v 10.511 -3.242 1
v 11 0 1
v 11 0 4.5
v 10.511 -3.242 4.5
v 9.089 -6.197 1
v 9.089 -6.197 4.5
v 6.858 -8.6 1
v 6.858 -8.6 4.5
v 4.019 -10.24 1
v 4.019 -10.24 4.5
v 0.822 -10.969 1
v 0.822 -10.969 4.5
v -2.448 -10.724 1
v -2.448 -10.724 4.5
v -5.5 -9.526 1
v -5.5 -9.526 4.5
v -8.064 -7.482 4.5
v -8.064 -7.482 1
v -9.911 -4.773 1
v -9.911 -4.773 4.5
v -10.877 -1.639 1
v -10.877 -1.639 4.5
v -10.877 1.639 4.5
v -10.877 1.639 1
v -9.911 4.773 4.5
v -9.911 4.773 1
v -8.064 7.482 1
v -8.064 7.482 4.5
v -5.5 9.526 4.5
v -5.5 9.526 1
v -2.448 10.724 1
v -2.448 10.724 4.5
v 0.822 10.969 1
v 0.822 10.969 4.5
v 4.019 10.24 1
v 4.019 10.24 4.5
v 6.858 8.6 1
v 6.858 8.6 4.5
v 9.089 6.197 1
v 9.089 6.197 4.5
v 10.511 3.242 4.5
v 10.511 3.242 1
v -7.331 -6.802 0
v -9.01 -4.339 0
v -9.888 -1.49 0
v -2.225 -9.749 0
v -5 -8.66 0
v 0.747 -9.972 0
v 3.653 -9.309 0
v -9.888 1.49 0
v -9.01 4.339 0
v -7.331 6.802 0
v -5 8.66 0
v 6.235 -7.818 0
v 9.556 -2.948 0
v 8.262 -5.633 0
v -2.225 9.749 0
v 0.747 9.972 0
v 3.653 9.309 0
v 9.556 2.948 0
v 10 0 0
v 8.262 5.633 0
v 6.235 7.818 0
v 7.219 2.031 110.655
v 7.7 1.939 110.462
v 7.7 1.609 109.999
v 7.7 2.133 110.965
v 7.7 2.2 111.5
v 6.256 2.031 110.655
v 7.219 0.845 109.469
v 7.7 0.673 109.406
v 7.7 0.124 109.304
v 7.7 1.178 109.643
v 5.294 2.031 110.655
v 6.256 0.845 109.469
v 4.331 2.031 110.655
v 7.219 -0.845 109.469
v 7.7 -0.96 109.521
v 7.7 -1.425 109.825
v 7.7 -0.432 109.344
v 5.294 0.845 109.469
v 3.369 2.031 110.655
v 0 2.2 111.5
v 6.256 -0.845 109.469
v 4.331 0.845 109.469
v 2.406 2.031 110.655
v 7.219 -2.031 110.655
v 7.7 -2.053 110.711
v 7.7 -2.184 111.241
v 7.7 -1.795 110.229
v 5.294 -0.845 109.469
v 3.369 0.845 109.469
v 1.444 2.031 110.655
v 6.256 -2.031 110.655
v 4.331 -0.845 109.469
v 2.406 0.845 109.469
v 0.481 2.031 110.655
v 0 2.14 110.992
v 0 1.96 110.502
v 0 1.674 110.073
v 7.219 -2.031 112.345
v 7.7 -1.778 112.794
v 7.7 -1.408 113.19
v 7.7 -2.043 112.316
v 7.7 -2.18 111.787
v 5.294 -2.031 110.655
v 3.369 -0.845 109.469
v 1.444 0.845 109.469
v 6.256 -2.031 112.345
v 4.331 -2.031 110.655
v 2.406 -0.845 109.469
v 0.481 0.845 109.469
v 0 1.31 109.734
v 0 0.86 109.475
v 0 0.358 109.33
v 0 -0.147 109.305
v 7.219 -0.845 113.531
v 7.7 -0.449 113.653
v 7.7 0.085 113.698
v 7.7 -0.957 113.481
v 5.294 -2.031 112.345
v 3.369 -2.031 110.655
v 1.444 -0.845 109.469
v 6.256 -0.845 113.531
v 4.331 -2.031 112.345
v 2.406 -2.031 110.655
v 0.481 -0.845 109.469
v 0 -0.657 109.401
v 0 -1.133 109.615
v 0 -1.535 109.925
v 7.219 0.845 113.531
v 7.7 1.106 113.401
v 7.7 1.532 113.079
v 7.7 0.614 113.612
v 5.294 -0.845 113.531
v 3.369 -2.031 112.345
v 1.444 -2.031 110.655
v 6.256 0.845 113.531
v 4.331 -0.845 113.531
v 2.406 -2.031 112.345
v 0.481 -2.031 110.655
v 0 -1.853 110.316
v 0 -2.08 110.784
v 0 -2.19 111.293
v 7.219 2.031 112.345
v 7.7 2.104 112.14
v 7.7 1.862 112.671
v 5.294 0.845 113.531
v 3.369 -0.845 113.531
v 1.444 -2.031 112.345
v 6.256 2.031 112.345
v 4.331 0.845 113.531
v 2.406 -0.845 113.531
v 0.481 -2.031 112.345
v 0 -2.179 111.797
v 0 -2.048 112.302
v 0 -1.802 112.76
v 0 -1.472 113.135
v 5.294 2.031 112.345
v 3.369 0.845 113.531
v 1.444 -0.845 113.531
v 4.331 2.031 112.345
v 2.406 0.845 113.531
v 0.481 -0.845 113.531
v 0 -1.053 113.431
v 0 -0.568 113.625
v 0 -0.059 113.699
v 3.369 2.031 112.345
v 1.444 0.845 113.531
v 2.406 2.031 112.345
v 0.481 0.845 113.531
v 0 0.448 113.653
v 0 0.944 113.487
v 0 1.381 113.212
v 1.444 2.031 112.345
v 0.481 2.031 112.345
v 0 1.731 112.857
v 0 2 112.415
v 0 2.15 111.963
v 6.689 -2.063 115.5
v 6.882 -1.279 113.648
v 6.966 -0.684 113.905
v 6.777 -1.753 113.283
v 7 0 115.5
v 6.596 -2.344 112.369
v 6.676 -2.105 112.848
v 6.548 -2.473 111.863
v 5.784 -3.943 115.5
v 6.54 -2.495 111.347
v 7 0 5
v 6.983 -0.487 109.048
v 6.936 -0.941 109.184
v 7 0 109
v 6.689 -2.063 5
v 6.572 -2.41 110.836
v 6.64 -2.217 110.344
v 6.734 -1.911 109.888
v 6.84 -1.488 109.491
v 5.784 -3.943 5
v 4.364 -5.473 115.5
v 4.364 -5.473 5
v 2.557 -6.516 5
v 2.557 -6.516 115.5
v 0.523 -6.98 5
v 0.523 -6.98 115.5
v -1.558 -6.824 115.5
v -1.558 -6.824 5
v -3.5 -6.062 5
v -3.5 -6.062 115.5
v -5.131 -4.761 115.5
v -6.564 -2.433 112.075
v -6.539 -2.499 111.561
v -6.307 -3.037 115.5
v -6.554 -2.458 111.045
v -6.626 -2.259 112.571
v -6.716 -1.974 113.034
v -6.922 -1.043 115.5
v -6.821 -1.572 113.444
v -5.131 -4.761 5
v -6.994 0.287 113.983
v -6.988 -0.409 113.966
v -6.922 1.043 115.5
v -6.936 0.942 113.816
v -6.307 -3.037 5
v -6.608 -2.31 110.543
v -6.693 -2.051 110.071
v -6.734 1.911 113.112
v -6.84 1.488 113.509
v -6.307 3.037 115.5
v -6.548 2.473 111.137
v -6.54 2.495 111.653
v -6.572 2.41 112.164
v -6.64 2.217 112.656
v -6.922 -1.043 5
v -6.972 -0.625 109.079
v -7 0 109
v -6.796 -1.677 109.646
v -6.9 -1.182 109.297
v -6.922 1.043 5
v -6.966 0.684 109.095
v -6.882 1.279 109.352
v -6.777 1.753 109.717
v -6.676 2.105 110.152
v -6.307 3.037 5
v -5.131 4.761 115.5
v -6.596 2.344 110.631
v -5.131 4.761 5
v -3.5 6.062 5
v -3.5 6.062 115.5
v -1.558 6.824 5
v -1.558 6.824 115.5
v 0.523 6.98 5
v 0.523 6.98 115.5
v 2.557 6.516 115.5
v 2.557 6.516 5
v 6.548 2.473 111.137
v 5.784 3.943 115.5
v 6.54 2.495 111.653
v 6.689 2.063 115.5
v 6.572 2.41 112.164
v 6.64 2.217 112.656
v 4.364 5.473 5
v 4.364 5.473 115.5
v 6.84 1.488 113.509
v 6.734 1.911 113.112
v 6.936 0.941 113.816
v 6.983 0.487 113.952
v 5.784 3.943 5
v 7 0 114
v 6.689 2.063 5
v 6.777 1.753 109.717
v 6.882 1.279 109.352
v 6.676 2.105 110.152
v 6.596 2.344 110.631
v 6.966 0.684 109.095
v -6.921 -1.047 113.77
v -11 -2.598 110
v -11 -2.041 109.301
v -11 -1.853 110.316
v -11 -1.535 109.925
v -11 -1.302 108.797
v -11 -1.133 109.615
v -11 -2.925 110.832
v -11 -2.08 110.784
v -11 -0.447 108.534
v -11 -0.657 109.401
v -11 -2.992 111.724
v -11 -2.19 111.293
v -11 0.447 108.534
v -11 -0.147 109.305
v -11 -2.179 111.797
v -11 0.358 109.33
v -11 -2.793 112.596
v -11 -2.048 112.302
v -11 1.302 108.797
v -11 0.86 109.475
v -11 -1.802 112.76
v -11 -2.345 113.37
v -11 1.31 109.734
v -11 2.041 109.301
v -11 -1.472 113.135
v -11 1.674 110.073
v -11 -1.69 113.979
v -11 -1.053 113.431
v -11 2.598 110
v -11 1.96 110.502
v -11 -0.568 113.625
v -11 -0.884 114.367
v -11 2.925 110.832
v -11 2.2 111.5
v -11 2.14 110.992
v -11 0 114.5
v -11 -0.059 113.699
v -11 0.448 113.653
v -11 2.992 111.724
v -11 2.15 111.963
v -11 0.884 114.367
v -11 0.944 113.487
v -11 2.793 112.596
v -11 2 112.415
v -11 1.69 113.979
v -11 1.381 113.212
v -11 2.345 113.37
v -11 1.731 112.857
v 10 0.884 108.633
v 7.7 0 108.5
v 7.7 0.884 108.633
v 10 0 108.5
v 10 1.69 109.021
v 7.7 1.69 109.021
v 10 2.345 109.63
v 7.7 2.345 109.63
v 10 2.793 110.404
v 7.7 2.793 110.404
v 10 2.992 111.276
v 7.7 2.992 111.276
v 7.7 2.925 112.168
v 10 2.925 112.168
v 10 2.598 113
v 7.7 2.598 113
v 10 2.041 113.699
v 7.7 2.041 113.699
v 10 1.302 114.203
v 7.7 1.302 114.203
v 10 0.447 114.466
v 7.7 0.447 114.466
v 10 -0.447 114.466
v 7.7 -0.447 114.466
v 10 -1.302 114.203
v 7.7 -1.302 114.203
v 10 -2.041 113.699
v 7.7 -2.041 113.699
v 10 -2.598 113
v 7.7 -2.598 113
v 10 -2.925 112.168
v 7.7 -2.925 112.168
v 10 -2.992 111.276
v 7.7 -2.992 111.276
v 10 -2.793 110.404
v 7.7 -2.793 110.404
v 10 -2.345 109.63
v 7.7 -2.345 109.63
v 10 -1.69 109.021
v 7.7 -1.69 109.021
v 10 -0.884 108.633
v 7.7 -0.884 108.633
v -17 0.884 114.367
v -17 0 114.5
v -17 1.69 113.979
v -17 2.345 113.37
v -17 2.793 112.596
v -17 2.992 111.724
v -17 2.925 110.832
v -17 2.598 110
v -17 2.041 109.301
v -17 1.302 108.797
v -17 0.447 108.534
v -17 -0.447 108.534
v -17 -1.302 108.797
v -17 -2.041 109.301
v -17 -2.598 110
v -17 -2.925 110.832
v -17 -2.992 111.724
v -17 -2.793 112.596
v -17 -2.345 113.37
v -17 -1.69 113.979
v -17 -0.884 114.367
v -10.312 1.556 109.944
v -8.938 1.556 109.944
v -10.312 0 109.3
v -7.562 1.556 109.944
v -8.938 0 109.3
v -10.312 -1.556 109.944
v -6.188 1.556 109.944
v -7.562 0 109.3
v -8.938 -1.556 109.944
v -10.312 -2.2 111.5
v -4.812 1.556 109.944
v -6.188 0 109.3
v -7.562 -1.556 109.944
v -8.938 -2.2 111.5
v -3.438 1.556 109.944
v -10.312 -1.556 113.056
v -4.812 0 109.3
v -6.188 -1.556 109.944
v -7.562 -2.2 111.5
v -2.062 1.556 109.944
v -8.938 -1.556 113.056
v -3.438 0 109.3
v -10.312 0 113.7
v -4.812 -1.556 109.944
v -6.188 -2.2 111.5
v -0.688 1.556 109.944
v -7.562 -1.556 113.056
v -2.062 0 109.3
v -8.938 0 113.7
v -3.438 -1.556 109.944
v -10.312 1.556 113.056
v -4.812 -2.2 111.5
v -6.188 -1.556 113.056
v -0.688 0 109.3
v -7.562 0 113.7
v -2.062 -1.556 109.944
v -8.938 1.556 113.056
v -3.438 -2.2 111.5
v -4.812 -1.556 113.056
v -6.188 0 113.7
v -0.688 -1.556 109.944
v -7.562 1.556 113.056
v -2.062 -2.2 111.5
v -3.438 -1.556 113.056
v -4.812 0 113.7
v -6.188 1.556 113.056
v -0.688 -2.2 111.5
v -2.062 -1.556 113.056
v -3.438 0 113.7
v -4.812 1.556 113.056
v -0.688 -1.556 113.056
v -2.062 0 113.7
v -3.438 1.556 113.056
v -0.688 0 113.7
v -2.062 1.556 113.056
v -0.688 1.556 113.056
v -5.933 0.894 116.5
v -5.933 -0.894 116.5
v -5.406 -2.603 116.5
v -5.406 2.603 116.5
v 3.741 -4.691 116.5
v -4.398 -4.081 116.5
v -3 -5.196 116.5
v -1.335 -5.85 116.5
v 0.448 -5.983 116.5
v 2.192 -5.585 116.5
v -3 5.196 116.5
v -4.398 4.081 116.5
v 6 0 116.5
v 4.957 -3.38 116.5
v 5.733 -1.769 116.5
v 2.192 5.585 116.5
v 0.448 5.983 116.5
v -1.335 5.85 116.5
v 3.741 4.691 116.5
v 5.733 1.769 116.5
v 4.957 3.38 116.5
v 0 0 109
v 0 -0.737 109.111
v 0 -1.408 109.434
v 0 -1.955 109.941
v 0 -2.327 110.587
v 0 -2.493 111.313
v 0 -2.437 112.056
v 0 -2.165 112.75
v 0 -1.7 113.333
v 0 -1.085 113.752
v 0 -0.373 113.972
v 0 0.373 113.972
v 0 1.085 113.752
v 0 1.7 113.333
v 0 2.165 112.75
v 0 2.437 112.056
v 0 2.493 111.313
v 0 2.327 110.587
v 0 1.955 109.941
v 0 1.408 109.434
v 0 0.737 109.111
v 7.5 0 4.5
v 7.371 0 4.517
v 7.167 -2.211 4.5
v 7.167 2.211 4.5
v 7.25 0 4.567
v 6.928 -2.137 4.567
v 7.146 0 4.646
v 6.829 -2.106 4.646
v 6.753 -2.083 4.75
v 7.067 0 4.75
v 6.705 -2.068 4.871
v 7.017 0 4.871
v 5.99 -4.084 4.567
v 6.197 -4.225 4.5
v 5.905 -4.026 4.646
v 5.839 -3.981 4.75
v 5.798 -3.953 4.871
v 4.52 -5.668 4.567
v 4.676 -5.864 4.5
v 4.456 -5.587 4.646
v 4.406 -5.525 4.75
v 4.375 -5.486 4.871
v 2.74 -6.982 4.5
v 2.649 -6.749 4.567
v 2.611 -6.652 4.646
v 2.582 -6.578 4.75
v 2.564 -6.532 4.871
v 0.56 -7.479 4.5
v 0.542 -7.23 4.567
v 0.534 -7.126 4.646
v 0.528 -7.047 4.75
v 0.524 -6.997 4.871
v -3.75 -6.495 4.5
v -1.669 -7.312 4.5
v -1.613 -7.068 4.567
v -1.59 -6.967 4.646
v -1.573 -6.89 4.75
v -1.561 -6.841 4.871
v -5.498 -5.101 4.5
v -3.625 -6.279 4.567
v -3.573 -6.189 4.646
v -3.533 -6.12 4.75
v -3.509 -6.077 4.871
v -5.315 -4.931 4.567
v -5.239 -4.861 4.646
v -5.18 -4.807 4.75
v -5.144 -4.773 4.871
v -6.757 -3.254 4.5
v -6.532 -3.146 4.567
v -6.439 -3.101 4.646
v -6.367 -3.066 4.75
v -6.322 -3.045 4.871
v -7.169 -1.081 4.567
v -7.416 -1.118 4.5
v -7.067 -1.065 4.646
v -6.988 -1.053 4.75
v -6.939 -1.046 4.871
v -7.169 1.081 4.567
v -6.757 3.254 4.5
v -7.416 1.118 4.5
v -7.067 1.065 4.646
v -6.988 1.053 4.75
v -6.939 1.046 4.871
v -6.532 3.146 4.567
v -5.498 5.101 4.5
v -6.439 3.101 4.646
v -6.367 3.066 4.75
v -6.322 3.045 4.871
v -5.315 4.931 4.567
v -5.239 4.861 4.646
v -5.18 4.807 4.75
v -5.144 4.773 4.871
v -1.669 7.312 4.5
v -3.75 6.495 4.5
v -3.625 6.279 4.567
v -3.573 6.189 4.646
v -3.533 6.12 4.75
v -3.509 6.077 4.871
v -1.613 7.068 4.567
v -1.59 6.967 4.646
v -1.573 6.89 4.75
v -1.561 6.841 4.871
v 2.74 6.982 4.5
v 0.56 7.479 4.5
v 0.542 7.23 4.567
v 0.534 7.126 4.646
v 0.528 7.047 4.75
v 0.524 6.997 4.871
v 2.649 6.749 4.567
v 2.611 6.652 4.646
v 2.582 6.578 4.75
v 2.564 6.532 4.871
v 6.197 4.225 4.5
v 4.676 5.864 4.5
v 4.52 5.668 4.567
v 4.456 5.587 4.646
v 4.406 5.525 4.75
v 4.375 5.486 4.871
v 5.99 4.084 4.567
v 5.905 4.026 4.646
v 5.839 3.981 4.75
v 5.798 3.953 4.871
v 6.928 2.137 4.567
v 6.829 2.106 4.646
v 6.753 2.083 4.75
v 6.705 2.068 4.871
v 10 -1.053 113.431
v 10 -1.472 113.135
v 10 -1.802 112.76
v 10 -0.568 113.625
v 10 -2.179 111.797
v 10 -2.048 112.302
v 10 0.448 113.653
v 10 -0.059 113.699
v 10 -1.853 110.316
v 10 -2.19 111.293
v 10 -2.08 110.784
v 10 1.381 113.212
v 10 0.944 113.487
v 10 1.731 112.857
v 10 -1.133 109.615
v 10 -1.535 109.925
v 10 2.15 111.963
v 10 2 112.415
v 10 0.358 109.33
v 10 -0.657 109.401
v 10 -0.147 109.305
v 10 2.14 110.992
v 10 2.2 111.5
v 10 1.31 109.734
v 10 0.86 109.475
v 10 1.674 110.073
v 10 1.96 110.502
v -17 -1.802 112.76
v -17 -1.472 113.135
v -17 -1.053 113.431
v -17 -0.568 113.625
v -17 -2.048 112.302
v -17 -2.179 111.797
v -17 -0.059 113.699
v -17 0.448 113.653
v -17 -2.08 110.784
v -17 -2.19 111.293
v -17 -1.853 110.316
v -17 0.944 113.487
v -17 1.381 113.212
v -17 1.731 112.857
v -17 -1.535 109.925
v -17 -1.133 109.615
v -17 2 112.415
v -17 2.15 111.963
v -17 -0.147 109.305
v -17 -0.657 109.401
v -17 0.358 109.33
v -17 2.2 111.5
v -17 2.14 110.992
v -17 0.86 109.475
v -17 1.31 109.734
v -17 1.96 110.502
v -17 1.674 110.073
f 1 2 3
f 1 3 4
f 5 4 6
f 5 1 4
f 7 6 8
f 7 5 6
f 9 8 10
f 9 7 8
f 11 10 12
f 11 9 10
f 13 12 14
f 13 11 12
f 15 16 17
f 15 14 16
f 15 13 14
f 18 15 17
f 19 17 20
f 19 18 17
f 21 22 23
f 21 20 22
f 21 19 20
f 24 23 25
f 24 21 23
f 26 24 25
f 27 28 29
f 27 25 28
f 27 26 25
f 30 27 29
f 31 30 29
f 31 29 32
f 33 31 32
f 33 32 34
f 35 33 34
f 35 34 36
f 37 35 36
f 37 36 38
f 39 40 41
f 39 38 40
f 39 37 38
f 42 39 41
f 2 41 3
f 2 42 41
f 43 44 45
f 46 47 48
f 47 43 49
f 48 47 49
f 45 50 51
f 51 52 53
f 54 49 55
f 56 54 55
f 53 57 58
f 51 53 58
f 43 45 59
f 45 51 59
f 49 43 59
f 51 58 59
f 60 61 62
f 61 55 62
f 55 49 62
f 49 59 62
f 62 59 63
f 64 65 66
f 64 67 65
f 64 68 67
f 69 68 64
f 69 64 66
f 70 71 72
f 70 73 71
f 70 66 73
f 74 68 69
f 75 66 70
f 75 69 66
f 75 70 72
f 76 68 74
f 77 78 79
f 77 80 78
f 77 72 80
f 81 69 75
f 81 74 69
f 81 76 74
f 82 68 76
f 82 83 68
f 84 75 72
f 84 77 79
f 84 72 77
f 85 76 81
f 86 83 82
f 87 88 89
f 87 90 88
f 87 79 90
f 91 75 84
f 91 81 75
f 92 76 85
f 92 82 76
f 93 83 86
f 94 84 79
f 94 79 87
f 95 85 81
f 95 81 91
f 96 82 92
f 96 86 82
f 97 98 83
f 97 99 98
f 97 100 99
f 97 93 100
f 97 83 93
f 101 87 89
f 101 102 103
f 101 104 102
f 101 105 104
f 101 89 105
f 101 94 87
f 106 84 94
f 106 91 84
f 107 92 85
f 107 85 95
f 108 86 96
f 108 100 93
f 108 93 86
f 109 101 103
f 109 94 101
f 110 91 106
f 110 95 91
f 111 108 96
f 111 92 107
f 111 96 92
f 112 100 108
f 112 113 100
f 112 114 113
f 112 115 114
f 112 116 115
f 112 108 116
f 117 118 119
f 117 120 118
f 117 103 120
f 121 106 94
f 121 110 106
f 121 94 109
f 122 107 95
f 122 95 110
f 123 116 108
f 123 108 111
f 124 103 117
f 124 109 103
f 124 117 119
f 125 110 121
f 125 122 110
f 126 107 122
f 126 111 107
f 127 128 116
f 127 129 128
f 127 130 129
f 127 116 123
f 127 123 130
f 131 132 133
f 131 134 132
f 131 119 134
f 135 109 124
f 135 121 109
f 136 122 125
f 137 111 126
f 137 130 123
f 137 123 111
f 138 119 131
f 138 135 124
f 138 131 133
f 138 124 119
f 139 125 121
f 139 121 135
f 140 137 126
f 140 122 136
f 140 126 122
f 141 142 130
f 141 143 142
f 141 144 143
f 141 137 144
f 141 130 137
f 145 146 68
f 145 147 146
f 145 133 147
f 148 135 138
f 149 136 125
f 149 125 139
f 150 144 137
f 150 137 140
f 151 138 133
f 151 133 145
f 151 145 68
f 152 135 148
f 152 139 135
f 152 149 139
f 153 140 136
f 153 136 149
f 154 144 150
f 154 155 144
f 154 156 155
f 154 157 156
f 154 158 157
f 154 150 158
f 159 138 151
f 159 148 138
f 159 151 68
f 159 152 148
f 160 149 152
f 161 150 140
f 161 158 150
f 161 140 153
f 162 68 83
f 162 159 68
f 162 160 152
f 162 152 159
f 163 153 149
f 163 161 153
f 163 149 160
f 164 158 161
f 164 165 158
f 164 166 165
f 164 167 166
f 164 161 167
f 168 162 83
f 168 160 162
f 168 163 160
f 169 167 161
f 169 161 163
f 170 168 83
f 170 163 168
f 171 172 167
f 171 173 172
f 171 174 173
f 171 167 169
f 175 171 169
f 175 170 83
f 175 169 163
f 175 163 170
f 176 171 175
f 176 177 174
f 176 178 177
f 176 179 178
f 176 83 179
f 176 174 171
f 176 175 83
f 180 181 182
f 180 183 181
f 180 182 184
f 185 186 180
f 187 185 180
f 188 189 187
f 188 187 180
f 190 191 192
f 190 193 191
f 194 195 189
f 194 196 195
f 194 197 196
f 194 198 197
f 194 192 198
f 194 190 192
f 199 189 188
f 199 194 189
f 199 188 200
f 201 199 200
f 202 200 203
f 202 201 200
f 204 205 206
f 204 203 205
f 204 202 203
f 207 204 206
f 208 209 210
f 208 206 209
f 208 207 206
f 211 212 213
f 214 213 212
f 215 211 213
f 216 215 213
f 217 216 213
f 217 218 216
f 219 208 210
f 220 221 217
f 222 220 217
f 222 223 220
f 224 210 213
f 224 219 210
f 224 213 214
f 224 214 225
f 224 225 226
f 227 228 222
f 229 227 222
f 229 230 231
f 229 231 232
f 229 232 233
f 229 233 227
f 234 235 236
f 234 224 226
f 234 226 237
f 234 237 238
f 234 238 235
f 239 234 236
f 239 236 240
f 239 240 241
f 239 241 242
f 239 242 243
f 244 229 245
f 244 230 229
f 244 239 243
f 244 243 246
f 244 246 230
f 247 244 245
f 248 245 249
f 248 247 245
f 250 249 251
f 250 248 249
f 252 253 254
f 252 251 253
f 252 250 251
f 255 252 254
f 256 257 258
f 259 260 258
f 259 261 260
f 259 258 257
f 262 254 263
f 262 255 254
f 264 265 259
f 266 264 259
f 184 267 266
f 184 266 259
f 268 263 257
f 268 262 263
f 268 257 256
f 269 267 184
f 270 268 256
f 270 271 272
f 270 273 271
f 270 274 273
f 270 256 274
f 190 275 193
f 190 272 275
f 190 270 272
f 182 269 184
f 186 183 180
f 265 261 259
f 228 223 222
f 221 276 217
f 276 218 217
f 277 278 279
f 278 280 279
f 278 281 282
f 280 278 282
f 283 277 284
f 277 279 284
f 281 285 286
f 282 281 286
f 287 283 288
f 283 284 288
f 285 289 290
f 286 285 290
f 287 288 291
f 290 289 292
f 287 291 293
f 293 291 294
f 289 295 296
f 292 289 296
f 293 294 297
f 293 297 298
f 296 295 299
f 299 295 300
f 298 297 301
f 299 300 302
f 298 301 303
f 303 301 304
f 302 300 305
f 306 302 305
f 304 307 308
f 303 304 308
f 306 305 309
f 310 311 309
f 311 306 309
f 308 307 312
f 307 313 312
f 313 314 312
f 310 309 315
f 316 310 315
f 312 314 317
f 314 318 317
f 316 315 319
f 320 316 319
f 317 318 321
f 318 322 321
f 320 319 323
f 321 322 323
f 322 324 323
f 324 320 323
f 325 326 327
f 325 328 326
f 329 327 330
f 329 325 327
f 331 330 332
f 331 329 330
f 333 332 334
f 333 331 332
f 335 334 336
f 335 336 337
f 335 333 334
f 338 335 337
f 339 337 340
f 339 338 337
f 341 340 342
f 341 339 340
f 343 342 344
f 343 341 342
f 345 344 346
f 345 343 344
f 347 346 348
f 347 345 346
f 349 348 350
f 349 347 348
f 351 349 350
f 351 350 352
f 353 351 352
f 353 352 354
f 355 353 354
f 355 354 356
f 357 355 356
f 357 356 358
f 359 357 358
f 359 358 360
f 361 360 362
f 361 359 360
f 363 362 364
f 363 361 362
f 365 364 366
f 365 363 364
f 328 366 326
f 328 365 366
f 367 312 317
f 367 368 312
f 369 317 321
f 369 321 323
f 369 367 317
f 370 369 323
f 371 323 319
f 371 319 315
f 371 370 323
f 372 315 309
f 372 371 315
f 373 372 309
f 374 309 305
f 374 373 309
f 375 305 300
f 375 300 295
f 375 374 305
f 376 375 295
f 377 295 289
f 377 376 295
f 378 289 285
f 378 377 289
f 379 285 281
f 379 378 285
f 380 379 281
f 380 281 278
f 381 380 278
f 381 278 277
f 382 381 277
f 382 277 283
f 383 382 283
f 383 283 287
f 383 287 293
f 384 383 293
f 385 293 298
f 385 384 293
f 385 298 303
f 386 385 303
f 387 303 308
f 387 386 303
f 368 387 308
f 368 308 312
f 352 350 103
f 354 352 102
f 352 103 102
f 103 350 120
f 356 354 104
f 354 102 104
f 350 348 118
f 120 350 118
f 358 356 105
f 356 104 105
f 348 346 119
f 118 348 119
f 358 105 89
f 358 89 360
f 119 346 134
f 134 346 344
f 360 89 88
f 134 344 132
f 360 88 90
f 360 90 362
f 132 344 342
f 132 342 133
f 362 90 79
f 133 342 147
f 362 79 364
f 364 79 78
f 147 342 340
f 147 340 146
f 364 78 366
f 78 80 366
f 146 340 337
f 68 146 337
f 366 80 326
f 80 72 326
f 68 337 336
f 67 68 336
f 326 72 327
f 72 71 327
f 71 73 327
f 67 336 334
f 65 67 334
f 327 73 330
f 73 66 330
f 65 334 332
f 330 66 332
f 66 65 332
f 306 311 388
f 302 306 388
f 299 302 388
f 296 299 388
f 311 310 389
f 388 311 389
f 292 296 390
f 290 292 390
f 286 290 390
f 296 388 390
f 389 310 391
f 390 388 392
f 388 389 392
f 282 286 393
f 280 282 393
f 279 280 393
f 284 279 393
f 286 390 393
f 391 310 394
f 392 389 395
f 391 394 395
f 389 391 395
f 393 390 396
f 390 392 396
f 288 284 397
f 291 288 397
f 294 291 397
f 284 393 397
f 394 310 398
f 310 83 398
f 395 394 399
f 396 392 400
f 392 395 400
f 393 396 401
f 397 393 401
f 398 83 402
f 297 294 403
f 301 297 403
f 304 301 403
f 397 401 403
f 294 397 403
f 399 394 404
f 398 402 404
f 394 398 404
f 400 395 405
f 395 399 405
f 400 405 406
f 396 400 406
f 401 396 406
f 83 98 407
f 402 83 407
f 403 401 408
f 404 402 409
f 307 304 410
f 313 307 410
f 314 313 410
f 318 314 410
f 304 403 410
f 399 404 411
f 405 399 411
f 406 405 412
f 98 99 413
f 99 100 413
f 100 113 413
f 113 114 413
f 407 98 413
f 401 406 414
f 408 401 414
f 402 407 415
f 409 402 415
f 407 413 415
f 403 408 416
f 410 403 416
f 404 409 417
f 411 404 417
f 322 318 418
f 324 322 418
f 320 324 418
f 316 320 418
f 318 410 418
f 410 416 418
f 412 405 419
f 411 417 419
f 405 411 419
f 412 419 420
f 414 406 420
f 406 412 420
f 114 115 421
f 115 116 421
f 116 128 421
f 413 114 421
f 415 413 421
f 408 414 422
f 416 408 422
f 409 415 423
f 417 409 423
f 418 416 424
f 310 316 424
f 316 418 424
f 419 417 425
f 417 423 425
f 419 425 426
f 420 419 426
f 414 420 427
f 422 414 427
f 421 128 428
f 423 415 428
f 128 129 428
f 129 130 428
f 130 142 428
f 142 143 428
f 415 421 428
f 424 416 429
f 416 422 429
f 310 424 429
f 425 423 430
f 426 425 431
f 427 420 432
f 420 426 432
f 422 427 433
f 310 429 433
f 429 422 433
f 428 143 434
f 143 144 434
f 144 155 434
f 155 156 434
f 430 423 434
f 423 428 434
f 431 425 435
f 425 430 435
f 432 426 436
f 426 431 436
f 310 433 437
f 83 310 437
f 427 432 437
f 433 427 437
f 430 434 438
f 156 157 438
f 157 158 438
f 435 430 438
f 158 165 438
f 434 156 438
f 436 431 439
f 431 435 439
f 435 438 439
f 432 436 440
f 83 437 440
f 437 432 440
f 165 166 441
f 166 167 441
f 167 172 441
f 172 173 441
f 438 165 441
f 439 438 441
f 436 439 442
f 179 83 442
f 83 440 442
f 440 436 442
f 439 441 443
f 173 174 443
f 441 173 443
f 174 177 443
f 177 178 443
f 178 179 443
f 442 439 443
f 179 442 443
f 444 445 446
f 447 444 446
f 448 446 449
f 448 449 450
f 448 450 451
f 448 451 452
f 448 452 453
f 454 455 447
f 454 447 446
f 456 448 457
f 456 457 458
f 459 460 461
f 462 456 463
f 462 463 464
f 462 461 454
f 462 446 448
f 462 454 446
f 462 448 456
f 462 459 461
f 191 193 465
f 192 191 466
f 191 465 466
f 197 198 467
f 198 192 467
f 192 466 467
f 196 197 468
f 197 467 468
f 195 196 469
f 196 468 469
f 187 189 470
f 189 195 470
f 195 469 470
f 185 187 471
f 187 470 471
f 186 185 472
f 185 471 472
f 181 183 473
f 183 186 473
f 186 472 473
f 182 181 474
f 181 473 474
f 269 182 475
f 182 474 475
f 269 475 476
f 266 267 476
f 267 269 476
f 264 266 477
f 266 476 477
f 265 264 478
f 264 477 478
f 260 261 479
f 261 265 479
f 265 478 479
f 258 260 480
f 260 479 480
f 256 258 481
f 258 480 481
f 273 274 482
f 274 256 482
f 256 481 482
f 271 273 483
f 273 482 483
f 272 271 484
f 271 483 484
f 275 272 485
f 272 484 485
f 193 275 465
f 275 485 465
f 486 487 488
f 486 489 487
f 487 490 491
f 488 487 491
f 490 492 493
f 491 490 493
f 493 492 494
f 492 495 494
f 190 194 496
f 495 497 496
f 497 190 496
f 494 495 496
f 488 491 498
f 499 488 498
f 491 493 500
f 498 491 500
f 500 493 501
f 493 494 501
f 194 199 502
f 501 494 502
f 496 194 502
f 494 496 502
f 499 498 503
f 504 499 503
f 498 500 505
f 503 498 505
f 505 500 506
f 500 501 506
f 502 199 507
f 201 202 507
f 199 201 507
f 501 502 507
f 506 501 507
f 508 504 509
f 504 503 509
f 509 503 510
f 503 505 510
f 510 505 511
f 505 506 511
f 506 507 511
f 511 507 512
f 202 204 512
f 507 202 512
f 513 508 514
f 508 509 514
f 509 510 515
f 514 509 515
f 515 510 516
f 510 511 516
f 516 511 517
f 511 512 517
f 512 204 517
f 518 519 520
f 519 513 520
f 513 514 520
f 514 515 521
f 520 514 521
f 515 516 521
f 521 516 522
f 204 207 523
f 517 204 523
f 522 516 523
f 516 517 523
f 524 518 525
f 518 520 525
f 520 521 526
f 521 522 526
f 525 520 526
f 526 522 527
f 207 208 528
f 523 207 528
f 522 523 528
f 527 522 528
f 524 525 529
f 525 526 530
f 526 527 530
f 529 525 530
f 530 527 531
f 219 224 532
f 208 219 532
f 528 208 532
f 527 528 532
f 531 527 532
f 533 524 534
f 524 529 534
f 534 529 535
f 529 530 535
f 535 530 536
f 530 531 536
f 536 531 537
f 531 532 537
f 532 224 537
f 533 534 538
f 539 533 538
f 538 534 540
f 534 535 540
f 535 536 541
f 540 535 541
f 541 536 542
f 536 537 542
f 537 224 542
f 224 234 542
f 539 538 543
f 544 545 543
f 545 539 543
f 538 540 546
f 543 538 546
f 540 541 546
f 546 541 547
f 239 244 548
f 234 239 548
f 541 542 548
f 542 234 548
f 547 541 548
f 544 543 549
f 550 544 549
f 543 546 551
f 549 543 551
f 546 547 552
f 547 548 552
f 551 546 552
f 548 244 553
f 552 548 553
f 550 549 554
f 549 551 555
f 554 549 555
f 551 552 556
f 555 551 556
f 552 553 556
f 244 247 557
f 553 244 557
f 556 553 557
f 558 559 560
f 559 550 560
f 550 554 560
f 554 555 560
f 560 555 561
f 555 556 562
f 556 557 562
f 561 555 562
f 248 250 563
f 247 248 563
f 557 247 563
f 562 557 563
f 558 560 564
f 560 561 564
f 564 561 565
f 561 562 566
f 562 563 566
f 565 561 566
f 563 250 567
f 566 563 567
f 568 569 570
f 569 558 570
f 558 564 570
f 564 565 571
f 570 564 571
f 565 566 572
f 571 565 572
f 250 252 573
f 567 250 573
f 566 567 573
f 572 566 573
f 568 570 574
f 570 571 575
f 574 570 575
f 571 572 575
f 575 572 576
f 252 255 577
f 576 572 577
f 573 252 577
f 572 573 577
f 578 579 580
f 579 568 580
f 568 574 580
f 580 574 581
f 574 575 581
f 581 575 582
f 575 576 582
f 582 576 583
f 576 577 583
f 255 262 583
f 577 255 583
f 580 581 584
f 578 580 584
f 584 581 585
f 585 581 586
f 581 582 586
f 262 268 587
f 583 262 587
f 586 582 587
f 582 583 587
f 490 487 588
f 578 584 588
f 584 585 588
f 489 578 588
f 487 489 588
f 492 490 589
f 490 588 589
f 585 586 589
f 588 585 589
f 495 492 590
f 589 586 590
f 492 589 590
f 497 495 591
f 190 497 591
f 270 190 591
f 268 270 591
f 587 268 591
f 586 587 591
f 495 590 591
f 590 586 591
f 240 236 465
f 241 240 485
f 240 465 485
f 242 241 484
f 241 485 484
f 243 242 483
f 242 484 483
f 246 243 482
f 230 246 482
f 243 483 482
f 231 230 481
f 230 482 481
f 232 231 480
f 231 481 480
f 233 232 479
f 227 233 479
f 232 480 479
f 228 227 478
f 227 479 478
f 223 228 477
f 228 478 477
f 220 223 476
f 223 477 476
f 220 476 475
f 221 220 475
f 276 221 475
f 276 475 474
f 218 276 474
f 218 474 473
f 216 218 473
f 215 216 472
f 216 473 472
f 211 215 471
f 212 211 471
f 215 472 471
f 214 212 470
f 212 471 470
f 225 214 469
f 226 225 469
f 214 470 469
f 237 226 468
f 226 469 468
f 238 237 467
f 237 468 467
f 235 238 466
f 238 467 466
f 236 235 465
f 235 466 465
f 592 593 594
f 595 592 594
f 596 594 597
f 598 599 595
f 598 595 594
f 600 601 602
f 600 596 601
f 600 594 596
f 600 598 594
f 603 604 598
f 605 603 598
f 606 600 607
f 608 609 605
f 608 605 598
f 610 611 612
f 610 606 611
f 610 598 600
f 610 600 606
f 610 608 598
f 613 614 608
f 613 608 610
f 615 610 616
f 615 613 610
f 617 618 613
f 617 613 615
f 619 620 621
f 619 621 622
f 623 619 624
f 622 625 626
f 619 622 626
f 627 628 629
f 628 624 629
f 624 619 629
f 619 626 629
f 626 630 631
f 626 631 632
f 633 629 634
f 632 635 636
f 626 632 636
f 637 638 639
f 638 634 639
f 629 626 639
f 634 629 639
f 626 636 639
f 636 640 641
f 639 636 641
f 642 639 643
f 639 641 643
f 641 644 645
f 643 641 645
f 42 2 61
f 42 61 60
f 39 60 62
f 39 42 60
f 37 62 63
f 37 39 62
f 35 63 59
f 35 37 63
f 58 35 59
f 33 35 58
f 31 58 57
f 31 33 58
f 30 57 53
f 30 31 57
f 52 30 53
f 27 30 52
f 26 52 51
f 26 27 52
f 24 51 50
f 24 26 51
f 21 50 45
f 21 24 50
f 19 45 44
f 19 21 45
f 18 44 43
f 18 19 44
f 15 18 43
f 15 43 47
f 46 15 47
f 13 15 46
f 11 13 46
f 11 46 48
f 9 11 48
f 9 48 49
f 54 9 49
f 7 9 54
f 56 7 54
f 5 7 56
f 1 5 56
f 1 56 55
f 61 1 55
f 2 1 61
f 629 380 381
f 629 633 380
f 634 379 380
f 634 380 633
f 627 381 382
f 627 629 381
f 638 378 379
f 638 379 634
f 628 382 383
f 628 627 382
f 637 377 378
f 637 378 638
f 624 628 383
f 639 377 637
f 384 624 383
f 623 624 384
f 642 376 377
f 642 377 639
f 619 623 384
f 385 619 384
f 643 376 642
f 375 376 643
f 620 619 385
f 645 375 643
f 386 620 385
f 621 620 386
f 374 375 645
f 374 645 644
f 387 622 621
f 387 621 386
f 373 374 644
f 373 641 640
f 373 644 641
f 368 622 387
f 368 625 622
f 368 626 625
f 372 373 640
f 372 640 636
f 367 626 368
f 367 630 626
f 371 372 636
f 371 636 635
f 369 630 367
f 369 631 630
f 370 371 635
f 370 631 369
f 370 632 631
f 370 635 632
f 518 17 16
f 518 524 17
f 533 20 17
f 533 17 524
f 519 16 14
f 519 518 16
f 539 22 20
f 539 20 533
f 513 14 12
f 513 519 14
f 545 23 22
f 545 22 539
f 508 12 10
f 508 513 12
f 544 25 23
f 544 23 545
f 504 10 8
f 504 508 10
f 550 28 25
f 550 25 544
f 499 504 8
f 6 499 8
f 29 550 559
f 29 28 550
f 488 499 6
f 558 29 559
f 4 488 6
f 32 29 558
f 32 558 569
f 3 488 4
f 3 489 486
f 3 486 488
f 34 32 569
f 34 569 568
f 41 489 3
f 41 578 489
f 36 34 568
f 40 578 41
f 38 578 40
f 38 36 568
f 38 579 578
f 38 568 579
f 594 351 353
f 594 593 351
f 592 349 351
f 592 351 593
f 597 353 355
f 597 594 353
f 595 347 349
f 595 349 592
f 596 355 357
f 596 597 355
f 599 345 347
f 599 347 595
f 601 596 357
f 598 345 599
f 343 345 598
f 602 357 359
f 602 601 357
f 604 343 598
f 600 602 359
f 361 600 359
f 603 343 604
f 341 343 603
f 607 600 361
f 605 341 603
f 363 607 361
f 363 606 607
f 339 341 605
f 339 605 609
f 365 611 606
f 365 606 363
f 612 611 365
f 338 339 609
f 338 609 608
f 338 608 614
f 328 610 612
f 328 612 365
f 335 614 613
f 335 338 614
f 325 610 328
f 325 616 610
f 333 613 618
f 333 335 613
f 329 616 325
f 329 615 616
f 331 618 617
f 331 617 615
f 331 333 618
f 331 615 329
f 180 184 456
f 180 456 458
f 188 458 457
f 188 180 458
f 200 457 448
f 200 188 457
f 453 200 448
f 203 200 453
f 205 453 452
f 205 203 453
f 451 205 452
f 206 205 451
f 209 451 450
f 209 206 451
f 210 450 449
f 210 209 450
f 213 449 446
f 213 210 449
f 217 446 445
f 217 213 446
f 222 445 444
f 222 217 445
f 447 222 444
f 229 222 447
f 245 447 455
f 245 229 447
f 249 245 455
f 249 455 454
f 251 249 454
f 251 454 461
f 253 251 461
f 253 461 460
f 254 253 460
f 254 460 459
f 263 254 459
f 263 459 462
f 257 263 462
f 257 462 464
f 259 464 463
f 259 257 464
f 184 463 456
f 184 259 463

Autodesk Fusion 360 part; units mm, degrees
sketch "Sketch1" plane through (0, 0, 0) normal (0, 0, 1) x (1, 0, 0)
  circle A0 centre (0, 0) radius 11
  dimension "d1" = 22
extrude "Extrude1" add sketch "Sketch1" along normal blind 4.5 makes body 1
chamfer "Chamfer1" distance 1 angle 45 1 edges at (-10.2556, -3.9778, 0) on bodies 1
sketch "Sketch2" plane through (0, 0, 4.5) normal (0, 0, 1) x (1, 0, 0)
  circle A0 centre (0, 0) radius 11
  circle A1 centre (0, 0) radius 7
  dimension "d5" = 14
extrude "Extrude2" add sketch "Sketch2" along normal blind 112 contours A1 bodies 1
fillet "Fillet1" radius 0.5 1 edges at (-6.5263, 2.5313, 4.5) on bodies 1
sketch "Sketch3" plane through (0, 0, 0) normal (1, 0, 0) x (0, 0, -1)
  line L0 (-116.5, 0) -> (-111.5, 0) construction
  circle A0 centre (-111.5, 0) radius 2.5
  point P0 (-116.5, 0)
  dimension "d9" = 5
  dimension "d10" = 5
extrude "Extrude3" cut sketch "Sketch3" along normal through all and the other way through all bodies 1
chamfer "Chamfer2" distance 1 angle 45 1 edges at (-6.5263, -2.5313, 116.5) on bodies 1
sketch "Sketch4" plane through (0, 0, 0) normal (1, 0, 0) x (0, 0, -1)
  spline S0 degree 3 poles (-111.5, 2.5) (-111.1829, 2.5) (-110.8469, 2.4361) (-110.2319, 2.1801) (-109.9527, 1.9882) (-109.5119, 1.5474) (-109.3199, 1.2682) (-109.0639, 0.653) (-109, 0.3169) (-109, -0.3169) (-109.0639, -0.653) (-109.3199, -1.2682) (-109.5119, -1.5474) (-109.9527, -1.9882) (-110.2319, -2.1801) (-110.8469, -2.4361) (-111.1829, -2.5) (-111.8171, -2.5) (-112.1531, -2.4361) (-112.7681, -2.1801) (-113.0473, -1.9882) (-113.4881, -1.5474) (-113.6801, -1.2682) (-113.9361, -0.653) (-114, -0.3169) (-114, 0.3169) (-113.9361, 0.653) (-113.6801, 1.2682) (-113.4881, 1.5474) (-113.0473, 1.9882) (-112.7681, 2.1801) (-112.1531, 2.4361) (-111.8171, 2.5) (-111.5, 2.5) knots 0 0 0 0 0.095117 0.095117 0.190234 0.190234 0.285292 0.285292 0.38035 0.38035 0.475408 0.475408 0.570466 0.570466 0.665583 0.665583 0.7607 0.7607 0.855818 0.855818 0.950935 0.950935 1.045993 1.045993 1.141051 1.141051 1.236109 1.236109 1.331167 1.331167 1.426284 1.426284 1.521401 1.521401 1.521401 1.521401
  spline S1 degree 3 poles (-111.5, 2.2) (-111.2233, 2.2) (-110.9233, 2.1429) (-110.6547, 2.0311) (-110.3859, 1.9193) (-110.1368, 1.7481) (-109.9444, 1.5556) (-109.752, 1.3633) (-109.5808, 1.1141) (-109.4689, 0.8453) (-109.357, 0.5766) (-109.3, 0.2765) (-109.3, 0) (-109.3, -0.2765) (-109.357, -0.5766) (-109.4689, -0.8453) (-109.5808, -1.1141) (-109.752, -1.3633) (-109.9444, -1.5556) (-110.1368, -1.7481) (-110.3859, -1.9193) (-110.6547, -2.0311) (-110.9233, -2.1429) (-111.2233, -2.2) (-111.5, -2.2) (-111.7767, -2.2) (-112.0767, -2.1429) (-112.3453, -2.0311) (-112.6141, -1.9193) (-112.8632, -1.7481) (-113.0556, -1.5556) (-113.248, -1.3633) (-113.4192, -1.1141) (-113.5311, -0.8453) (-113.643, -0.5766) (-113.7, -0.2765) (-113.7, 0) (-113.7, 0.2765) (-113.643, 0.5766) (-113.5311, 0.8453) (-113.4192, 1.1141) (-113.248, 1.3633) (-113.0556, 1.5556) (-112.8632, 1.7481) (-112.6141, 1.9193) (-112.3453, 2.0311) (-112.0767, 2.1429) (-111.7767, 2.2) (-111.5, 2.2) knots 0 0 0 0 0.095117 0.095117 0.095117 0.190234 0.190234 0.190234 0.285292 0.285292 0.285292 0.38035 0.38035 0.38035 0.475408 0.475408 0.475408 0.570466 0.570466 0.570466 0.665583 0.665583 0.665583 0.7607 0.7607 0.7607 0.855818 0.855818 0.855818 0.950935 0.950935 0.950935 1.045993 1.045993 1.045993 1.141051 1.141051 1.141051 1.236109 1.236109 1.236109 1.331167 1.331167 1.331167 1.426284 1.426284 1.426284 1.521401 1.521401 1.521401 1.521401
  dimension "d14" = 0.3
extrude "Extrude4" add sketch "Sketch4" along normal blind 10 and the other way blind 17 separate body contours S1 makes body 2
sketch "Sketch5" plane through (10, 0, 0) normal (1, 0, 0) x (0, 0, -1)
  spline S0 degree 3 poles (-111.5, 2.2) (-111.7767, 2.2) (-112.0767, 2.1429) (-112.3453, 2.0311) (-112.6141, 1.9193) (-112.8632, 1.7481) (-113.0556, 1.5556) (-113.248, 1.3633) (-113.4192, 1.1141) (-113.5311, 0.8453) (-113.643, 0.5766) (-113.7, 0.2765) (-113.7, 0) (-113.7, -0.2765) (-113.643, -0.5766) (-113.5311, -0.8453) (-113.4192, -1.1141) (-113.248, -1.3633) (-113.0556, -1.5556) (-112.8632, -1.7481) (-112.6141, -1.9193) (-112.3453, -2.0311) (-112.0767, -2.1429) (-111.7767, -2.2) (-111.5, -2.2) (-111.2233, -2.2) (-110.9233, -2.1429) (-110.6547, -2.0311) (-110.3859, -1.9193) (-110.1368, -1.7481) (-109.9444, -1.5556) (-109.752, -1.3633) (-109.5808, -1.1141) (-109.4689, -0.8453) (-109.357, -0.5766) (-109.3, -0.2765) (-109.3, 0) (-109.3, 0.2765) (-109.357, 0.5766) (-109.4689, 0.8453) (-109.5808, 1.1141) (-109.752, 1.3633) (-109.9444, 1.5556) (-110.1368, 1.7481) (-110.3859, 1.9193) (-110.6547, 2.0311) (-110.9233, 2.1429) (-111.2233, 2.2) (-111.5, 2.2) knots -1.521401 -1.521401 -1.521401 -1.521401 -1.426284 -1.426284 -1.426284 -1.331167 -1.331167 -1.331167 -1.236109 -1.236109 -1.236109 -1.141051 -1.141051 -1.141051 -1.045993 -1.045993 -1.045993 -0.950935 -0.950935 -0.950935 -0.855818 -0.855818 -0.855818 -0.7607 -0.7607 -0.7607 -0.665583 -0.665583 -0.665583 -0.570466 -0.570466 -0.570466 -0.475408 -0.475408 -0.475408 -0.38035 -0.38035 -0.38035 -0.285292 -0.285292 -0.285292 -0.190234 -0.190234 -0.190234 -0.095117 -0.095117 -0.095117 0 0 0 0
  spline S1 degree 3 poles (-111.5, 2.2) (-111.7767, 2.2) (-112.0767, 2.1429) (-112.3453, 2.0311) (-112.6141, 1.9193) (-112.8632, 1.7481) (-113.0556, 1.5556) (-113.248, 1.3633) (-113.4192, 1.1141) (-113.5311, 0.8453) (-113.643, 0.5766) (-113.7, 0.2765) (-113.7, 0) (-113.7, -0.2765) (-113.643, -0.5766) (-113.5311, -0.8453) (-113.4192, -1.1141) (-113.248, -1.3633) (-113.0556, -1.5556) (-112.8632, -1.7481) (-112.6141, -1.9193) (-112.3453, -2.0311) (-112.0767, -2.1429) (-111.7767, -2.2) (-111.5, -2.2) (-111.2233, -2.2) (-110.9233, -2.1429) (-110.6547, -2.0311) (-110.3859, -1.9193) (-110.1368, -1.7481) (-109.9444, -1.5556) (-109.752, -1.3633) (-109.5808, -1.1141) (-109.4689, -0.8453) (-109.357, -0.5766) (-109.3, -0.2765) (-109.3, 0) (-109.3, 0.2765) (-109.357, 0.5766) (-109.4689, 0.8453) (-109.5808, 1.1141) (-109.752, 1.3633) (-109.9444, 1.5556) (-110.1368, 1.7481) (-110.3859, 1.9193) (-110.6547, 2.0311) (-110.9233, 2.1429) (-111.2233, 2.2) (-111.5, 2.2) knots -1.521401 -1.521401 -1.521401 -1.521401 -1.426284 -1.426284 -1.426284 -1.331167 -1.331167 -1.331167 -1.236109 -1.236109 -1.236109 -1.141051 -1.141051 -1.141051 -1.045993 -1.045993 -1.045993 -0.950935 -0.950935 -0.950935 -0.855818 -0.855818 -0.855818 -0.7607 -0.7607 -0.7607 -0.665583 -0.665583 -0.665583 -0.570466 -0.570466 -0.570466 -0.475408 -0.475408 -0.475408 -0.38035 -0.38035 -0.38035 -0.285292 -0.285292 -0.285292 -0.190234 -0.190234 -0.190234 -0.095117 -0.095117 -0.095117 0 0 0 0
  spline S2 degree 3 poles (-111.5, 2.2) (-111.2233, 2.2) (-110.9233, 2.1429) (-110.6547, 2.0311) (-110.3859, 1.9193) (-110.1368, 1.7481) (-109.9444, 1.5556) (-109.752, 1.3633) (-109.5808, 1.1141) (-109.4689, 0.8453) (-109.357, 0.5766) (-109.3, 0.2765) (-109.3, 0) (-109.3, -0.2765) (-109.357, -0.5766) (-109.4689, -0.8453) (-109.5808, -1.1141) (-109.752, -1.3633) (-109.9444, -1.5556) (-110.1368, -1.7481) (-110.3859, -1.9193) (-110.6547, -2.0311) (-110.9233, -2.1429) (-111.2233, -2.2) (-111.5, -2.2) (-111.7767, -2.2) (-112.0767, -2.1429) (-112.3453, -2.0311) (-112.6141, -1.9193) (-112.8632, -1.7481) (-113.0556, -1.5556) (-113.248, -1.3633) (-113.4192, -1.1141) (-113.5311, -0.8453) (-113.643, -0.5766) (-113.7, -0.2765) (-113.7, 0) (-113.7, 0.2765) (-113.643, 0.5766) (-113.5311, 0.8453) (-113.4192, 1.1141) (-113.248, 1.3633) (-113.0556, 1.5556) (-112.8632, 1.7481) (-112.6141, 1.9193) (-112.3453, 2.0311) (-112.0767, 2.1429) (-111.7767, 2.2) (-111.5, 2.2) knots 0 0 0 0 0.095117 0.095117 0.095117 0.190234 0.190234 0.190234 0.285292 0.285292 0.285292 0.38035 0.38035 0.38035 0.475408 0.475408 0.475408 0.570466 0.570466 0.570466 0.665583 0.665583 0.665583 0.7607 0.7607 0.7607 0.855818 0.855818 0.855818 0.950935 0.950935 0.950935 1.045993 1.045993 1.045993 1.141051 1.141051 1.141051 1.236109 1.236109 1.236109 1.331167 1.331167 1.331167 1.426284 1.426284 1.426284 1.521401 1.521401 1.521401 1.521401
  circle A0 centre (-111.5, 0) radius 3
  point P0 (-111.5, 2.2)
  dimension "d19" = 6
extrude "Extrude5" add sketch "Sketch5" against normal blind 2.3 contours S0 S1 S2 | A0 bodies 2
sketch "Sketch6" plane through (-17, 0, 0) normal (-1, 0, 0) x (0, 0, 1)
  spline S0 degree 3 poles (111.5, 2.2) (111.2233, 2.2) (110.9233, 2.1429) (110.6547, 2.0311) (110.3859, 1.9193) (110.1368, 1.7481) (109.9444, 1.5556) (109.752, 1.3633) (109.5808, 1.1141) (109.4689, 0.8453) (109.357, 0.5766) (109.3, 0.2765) (109.3, 0) (109.3, -0.2765) (109.357, -0.5766) (109.4689, -0.8453) (109.5808, -1.1141) (109.752, -1.3633) (109.9444, -1.5556) (110.1368, -1.7481) (110.3859, -1.9193) (110.6547, -2.0311) (110.9233, -2.1429) (111.2233, -2.2) (111.5, -2.2) (111.7767, -2.2) (112.0767, -2.1429) (112.3453, -2.0311) (112.6141, -1.9193) (112.8632, -1.7481) (113.0556, -1.5556) (113.248, -1.3633) (113.4192, -1.1141) (113.5311, -0.8453) (113.643, -0.5766) (113.7, -0.2765) (113.7, 0) (113.7, 0.2765) (113.643, 0.5766) (113.5311, 0.8453) (113.4192, 1.1141) (113.248, 1.3633) (113.0556, 1.5556) (112.8632, 1.7481) (112.6141, 1.9193) (112.3453, 2.0311) (112.0767, 2.1429) (111.7767, 2.2) (111.5, 2.2) knots 0 0 0 0 0.095117 0.095117 0.095117 0.190234 0.190234 0.190234 0.285292 0.285292 0.285292 0.38035 0.38035 0.38035 0.475408 0.475408 0.475408 0.570466 0.570466 0.570466 0.665583 0.665583 0.665583 0.7607 0.7607 0.7607 0.855818 0.855818 0.855818 0.950935 0.950935 0.950935 1.045993 1.045993 1.045993 1.141051 1.141051 1.141051 1.236109 1.236109 1.236109 1.331167 1.331167 1.331167 1.426284 1.426284 1.426284 1.521401 1.521401 1.521401 1.521401
  spline S1 degree 3 poles (111.5, 2.2) (111.4677, 2.1998) (111.4353, 2.1992) (111.1486, 2.1858) (110.8625, 2.122) (110.3144, 1.8831) (110.0981, 1.7094) (109.9444, 1.5556) (109.8214, 1.4326) (109.7114, 1.2909) (109.4765, 0.9058) (109.43, 0.7525) (109.3181, 0.3857) (109.2816, 0.0841) (109.3377, -0.4851) (109.4212, -0.7753) (109.6832, -1.2685) (109.8714, -1.5088) (110.3142, -1.8722) (110.5754, -2.0164) (111.1039, -2.1798) (111.4061, -2.2181) (111.9714, -2.1648) (112.2628, -2.0835) (112.7542, -1.8261) (112.9972, -1.6395) (113.3592, -1.2045) (113.5073, -0.9446) (113.6735, -0.4247) (113.717, -0.1208) (113.671, 0.4363) (113.5949, 0.7304) (113.3527, 1.212) (113.1703, 1.4637) (112.7547, 1.8231) (112.4982, 1.981) (112.0701, 2.1313) (111.7856, 2.1974) (111.5, 2.2) knots -0.122125 -0.122125 -0.122125 -0.122125 -0.115736 -0.115736 -0.065218 -0.065218 0 0 0 0.052189 0.052189 0.134842 0.134842 0.34423 0.34423 0.542353 0.542353 0.733658 0.733658 0.91385 0.91385 1.08848 1.08848 1.25086 1.25086 1.405126 1.405126 1.546294 1.546294 1.679136 1.679136 1.797637 1.797637 1.905712 1.905712 1.996221 1.996221 2.052666 2.052666 2.052666 2.052666 construction
  spline S2 degree 3 poles (111.5, 2.2) (111.2233, 2.2) (110.9233, 2.1429) (110.6547, 2.0311) (110.3859, 1.9193) (110.1368, 1.7481) (109.9444, 1.5556) (109.752, 1.3633) (109.5808, 1.1141) (109.4689, 0.8453) (109.357, 0.5766) (109.3, 0.2765) (109.3, 0) (109.3, -0.2765) (109.357, -0.5766) (109.4689, -0.8453) (109.5808, -1.1141) (109.752, -1.3633) (109.9444, -1.5556) (110.1368, -1.7481) (110.3859, -1.9193) (110.6547, -2.0311) (110.9233, -2.1429) (111.2233, -2.2) (111.5, -2.2) (111.7767, -2.2) (112.0767, -2.1429) (112.3453, -2.0311) (112.6141, -1.9193) (112.8632, -1.7481) (113.0556, -1.5556) (113.248, -1.3633) (113.4192, -1.1141) (113.5311, -0.8453) (113.643, -0.5766) (113.7, -0.2765) (113.7, 0) (113.7, 0.2765) (113.643, 0.5766) (113.5311, 0.8453) (113.4192, 1.1141) (113.248, 1.3633) (113.0556, 1.5556) (112.8632, 1.7481) (112.6141, 1.9193) (112.3453, 2.0311) (112.0767, 2.1429) (111.7767, 2.2) (111.5, 2.2) knots 0 0 0 0 0.095117 0.095117 0.095117 0.190234 0.190234 0.190234 0.285292 0.285292 0.285292 0.38035 0.38035 0.38035 0.475408 0.475408 0.475408 0.570466 0.570466 0.570466 0.665583 0.665583 0.665583 0.7607 0.7607 0.7607 0.855818 0.855818 0.855818 0.950935 0.950935 0.950935 1.045993 1.045993 1.045993 1.141051 1.141051 1.141051 1.236109 1.236109 1.236109 1.331167 1.331167 1.331167 1.426284 1.426284 1.426284 1.521401 1.521401 1.521401 1.521401
  circle A0 centre (111.5, 0) radius 3
  point P0 (111.5, 2.2)
  dimension "d22" = 6
extrude "Extrude6" add sketch "Sketch6" against normal blind 6 bodies 2
